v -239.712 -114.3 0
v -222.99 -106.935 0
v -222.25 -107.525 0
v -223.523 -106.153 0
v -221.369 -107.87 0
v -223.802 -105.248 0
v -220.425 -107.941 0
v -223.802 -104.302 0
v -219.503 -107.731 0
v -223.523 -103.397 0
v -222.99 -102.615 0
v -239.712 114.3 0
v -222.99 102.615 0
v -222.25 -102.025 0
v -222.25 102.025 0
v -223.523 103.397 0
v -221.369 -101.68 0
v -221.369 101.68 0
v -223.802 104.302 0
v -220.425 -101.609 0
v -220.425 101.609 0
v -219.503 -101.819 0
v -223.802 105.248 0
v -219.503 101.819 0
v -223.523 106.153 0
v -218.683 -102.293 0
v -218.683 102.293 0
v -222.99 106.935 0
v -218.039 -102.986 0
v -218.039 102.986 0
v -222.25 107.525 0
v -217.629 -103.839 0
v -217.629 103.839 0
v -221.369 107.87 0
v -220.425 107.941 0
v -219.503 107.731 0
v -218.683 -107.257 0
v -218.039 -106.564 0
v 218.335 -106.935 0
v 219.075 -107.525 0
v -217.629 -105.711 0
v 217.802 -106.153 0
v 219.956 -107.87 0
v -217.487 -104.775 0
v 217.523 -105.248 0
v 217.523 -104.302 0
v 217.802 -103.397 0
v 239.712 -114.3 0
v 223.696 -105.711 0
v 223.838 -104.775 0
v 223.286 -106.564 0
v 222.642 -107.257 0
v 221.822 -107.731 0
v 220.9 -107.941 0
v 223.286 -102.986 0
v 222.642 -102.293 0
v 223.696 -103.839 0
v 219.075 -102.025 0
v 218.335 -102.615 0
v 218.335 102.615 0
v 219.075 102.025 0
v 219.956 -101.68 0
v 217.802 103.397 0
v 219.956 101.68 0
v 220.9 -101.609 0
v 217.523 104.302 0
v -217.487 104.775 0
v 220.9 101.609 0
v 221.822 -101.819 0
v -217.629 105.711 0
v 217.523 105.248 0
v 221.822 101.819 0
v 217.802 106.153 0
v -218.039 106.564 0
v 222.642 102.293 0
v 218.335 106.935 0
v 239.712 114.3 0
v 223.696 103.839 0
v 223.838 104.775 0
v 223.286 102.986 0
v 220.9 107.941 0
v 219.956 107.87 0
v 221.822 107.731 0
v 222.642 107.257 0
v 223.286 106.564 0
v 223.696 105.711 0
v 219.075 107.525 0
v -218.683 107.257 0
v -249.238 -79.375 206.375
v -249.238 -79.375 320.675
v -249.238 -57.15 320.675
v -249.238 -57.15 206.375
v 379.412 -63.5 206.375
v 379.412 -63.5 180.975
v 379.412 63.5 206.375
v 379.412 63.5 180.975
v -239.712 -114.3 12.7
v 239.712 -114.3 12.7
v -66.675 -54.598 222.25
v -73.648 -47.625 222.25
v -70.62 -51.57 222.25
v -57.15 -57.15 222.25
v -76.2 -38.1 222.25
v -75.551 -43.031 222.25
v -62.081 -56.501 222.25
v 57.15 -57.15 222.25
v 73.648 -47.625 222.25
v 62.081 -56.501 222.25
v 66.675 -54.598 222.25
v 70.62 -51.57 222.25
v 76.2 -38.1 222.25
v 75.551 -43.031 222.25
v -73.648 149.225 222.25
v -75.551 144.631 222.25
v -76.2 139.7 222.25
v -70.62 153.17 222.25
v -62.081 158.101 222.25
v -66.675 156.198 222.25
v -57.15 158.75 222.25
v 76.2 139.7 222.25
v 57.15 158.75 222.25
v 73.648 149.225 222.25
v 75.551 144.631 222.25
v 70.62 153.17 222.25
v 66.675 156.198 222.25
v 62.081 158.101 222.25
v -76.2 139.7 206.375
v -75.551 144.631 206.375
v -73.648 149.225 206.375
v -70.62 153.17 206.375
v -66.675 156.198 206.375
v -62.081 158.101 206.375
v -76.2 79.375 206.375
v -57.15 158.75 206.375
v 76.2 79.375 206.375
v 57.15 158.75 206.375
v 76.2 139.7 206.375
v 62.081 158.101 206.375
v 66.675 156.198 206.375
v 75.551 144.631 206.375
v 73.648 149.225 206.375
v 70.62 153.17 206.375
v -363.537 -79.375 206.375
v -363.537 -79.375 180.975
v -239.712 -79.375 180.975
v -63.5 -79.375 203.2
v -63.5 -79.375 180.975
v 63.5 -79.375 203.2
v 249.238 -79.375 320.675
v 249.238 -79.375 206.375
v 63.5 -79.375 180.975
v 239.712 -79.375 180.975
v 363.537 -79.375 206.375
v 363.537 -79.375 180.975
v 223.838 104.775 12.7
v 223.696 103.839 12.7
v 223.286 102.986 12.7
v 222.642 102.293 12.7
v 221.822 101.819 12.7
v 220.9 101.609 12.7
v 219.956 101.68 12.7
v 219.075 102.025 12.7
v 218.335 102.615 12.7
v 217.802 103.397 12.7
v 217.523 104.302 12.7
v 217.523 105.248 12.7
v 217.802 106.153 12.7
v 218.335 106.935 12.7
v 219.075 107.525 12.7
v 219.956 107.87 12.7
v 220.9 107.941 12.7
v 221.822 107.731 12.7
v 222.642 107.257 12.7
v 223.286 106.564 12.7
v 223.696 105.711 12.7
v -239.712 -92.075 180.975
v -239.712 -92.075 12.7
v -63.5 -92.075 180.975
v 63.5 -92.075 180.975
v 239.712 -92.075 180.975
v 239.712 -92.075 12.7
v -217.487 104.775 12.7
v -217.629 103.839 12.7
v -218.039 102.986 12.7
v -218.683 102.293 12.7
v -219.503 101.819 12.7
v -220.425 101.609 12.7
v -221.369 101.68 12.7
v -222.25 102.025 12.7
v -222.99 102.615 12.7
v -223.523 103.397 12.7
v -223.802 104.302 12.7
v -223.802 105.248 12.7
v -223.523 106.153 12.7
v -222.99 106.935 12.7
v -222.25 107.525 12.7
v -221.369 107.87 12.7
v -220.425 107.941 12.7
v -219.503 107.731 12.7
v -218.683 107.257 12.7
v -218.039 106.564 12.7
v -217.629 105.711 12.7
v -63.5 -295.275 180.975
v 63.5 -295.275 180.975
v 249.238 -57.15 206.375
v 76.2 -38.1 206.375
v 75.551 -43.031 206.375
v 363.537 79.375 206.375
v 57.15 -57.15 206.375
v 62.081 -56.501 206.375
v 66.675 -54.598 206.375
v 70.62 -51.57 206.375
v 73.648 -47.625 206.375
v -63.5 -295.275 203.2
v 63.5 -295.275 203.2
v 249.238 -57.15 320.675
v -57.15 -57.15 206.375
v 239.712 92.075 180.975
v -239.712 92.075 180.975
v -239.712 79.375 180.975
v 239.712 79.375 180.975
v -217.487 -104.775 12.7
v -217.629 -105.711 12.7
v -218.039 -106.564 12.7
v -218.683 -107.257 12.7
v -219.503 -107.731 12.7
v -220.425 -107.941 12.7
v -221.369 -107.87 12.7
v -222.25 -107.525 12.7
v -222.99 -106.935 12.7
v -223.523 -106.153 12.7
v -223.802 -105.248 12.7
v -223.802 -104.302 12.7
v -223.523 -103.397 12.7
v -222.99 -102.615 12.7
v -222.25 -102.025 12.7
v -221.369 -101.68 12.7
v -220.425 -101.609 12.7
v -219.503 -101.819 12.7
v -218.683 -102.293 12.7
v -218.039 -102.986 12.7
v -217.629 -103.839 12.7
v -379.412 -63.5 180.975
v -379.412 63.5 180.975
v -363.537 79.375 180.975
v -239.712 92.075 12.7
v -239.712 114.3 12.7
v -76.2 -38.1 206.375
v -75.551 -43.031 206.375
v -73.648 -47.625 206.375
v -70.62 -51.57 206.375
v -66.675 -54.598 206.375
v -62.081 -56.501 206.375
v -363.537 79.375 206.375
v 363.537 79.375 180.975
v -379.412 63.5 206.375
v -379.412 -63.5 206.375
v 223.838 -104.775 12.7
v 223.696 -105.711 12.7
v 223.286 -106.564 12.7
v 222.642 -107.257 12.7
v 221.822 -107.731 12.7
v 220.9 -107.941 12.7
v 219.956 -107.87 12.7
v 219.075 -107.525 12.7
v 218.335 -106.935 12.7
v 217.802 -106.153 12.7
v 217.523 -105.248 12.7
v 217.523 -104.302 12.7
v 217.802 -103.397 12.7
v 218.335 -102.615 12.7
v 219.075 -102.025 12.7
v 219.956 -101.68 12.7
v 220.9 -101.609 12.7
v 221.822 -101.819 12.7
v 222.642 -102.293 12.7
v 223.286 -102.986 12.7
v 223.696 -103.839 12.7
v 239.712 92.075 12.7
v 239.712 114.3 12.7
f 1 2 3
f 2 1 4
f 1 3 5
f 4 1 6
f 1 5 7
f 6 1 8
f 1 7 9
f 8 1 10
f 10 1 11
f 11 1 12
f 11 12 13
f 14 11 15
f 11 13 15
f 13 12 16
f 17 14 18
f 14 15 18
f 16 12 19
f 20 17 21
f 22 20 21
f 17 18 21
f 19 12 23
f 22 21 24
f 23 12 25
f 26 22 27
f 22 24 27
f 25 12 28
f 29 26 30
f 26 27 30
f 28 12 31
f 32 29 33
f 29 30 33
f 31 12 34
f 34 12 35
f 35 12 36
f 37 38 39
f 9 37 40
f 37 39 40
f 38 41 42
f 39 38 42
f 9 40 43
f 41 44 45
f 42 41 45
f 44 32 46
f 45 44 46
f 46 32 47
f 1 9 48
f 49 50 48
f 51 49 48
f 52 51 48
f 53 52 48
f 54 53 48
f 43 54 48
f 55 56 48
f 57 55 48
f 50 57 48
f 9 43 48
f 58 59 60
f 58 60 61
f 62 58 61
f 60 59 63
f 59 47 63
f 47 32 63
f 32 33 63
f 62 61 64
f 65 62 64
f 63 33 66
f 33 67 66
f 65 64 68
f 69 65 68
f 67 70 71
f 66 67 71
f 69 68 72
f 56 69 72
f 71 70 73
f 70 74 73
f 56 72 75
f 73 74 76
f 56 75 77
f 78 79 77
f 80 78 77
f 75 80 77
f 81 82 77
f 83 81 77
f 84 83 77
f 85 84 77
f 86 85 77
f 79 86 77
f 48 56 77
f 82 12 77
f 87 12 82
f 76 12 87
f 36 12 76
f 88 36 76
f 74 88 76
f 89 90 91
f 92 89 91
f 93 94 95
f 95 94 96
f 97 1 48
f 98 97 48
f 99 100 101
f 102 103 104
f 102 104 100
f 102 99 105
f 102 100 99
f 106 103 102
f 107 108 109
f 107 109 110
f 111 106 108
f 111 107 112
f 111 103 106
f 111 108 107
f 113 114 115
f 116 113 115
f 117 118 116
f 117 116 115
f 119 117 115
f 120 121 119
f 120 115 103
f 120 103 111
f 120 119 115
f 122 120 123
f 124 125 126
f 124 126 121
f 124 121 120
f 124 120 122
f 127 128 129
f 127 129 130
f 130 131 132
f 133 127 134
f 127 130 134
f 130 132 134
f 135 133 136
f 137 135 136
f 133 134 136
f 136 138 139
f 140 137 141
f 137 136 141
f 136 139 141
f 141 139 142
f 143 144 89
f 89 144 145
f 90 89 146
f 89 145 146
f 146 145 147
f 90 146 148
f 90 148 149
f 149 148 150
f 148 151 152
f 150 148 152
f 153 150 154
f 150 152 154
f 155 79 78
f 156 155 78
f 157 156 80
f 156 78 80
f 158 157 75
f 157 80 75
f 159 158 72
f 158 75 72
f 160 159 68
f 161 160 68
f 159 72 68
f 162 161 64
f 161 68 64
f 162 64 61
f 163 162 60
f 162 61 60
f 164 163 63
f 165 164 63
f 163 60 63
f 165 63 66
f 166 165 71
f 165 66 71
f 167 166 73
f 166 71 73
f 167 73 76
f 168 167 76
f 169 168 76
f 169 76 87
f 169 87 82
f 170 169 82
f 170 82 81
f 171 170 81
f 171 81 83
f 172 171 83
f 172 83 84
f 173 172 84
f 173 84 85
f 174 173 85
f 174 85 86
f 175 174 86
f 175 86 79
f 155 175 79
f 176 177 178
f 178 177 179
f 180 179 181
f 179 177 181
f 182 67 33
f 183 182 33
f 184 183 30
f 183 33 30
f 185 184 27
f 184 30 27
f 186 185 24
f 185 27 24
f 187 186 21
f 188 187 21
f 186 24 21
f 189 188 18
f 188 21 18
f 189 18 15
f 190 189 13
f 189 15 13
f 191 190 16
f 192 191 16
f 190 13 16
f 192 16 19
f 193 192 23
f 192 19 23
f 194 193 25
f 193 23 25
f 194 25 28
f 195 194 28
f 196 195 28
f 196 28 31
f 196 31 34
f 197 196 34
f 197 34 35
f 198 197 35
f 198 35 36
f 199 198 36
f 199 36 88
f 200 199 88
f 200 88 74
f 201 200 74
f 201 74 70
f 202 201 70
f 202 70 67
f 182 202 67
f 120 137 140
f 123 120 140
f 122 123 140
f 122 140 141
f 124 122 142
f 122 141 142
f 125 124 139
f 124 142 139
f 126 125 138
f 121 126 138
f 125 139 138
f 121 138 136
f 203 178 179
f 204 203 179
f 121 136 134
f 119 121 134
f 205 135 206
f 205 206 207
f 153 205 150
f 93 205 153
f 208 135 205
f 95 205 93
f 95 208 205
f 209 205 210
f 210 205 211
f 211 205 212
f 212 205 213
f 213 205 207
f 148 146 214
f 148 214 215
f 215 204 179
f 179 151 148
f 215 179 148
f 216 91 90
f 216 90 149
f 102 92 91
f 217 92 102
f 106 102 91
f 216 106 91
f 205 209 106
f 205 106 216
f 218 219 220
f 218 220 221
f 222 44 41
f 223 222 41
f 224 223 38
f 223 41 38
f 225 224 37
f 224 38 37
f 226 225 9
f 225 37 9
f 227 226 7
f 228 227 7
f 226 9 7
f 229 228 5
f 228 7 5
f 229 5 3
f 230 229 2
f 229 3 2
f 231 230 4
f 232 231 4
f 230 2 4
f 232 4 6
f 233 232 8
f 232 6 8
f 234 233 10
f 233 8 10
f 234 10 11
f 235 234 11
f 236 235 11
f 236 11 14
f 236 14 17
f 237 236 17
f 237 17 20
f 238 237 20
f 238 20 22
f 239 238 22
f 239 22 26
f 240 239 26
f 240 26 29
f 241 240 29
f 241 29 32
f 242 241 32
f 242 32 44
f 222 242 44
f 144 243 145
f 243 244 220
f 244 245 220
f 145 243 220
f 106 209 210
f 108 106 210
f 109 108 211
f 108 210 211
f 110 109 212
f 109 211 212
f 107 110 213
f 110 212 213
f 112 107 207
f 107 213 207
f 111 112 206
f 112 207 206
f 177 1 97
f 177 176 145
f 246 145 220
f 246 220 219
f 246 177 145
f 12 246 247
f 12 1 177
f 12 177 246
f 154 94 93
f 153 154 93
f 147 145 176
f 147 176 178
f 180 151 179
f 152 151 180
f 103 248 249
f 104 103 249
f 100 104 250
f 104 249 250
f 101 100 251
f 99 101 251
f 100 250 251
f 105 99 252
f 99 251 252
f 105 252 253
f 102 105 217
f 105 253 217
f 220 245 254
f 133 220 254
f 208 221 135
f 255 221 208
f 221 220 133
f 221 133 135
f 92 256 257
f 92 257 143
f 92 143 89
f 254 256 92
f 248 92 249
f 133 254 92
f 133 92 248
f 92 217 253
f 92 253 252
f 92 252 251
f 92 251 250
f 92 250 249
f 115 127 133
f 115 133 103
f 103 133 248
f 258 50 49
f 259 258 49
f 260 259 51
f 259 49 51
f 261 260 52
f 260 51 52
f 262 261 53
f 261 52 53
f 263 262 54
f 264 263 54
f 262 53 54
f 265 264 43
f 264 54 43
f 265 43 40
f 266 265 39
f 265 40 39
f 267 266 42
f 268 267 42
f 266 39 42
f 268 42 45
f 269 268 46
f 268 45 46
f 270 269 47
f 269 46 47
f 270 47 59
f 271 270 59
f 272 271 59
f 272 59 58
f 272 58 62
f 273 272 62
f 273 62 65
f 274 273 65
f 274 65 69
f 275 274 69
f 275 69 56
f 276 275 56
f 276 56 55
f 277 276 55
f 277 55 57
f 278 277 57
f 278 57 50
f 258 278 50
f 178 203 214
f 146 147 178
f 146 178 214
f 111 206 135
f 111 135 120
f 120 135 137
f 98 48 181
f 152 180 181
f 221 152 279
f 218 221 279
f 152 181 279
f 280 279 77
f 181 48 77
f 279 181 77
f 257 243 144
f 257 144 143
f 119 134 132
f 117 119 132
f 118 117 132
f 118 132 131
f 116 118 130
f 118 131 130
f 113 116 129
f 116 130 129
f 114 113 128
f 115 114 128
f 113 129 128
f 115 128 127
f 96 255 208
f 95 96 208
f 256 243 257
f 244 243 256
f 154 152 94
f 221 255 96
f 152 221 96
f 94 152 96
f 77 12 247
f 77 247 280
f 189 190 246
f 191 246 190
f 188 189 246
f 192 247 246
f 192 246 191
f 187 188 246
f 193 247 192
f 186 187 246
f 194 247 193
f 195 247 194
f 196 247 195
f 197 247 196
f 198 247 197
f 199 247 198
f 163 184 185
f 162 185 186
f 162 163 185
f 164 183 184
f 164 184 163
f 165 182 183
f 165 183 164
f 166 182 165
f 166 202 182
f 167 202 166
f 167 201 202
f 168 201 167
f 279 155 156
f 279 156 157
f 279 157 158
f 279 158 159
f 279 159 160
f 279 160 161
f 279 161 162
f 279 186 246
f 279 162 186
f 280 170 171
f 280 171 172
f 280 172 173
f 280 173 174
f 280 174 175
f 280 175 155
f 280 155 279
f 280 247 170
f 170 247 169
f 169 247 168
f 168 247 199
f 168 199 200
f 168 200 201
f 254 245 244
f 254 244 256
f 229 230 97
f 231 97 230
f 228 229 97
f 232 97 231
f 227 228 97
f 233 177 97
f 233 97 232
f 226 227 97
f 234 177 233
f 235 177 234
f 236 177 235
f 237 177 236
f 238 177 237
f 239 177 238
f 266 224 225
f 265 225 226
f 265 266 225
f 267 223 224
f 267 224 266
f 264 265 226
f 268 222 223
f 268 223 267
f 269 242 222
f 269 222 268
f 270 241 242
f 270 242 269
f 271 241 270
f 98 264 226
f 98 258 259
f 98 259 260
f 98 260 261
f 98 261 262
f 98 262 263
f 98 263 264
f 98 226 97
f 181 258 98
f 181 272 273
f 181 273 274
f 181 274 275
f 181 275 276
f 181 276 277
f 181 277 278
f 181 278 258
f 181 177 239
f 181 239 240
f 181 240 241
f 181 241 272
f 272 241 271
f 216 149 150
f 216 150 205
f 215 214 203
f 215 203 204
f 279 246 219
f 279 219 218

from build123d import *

# Parameters (mm, degrees)
F0_W      = 479.425
F0_H      = 228.6
F1_DEPTH  = 12.7
F2_R      = 3.175
F3_DEPTH  = 12.701
F4_W      = 479.425
F4_H      = 184.15
F5_DEPTH  = 168.275
F6_W      = 758.825
F6_H      = 158.75
F7_DEPTH  = 25.4
F8_W      = 498.475
F8_H      = 22.225
F9_DEPTH  = 114.3
F10_W     = 127
F10_H     = 22.225
F11_DEPTH = 215.9
F12_SIZE  = 15.875
F14_DEPTH = 15.875


with BuildPart() as f1:
    # F0 (on Top) → F1 (new body)
    with BuildSketch(Plane.XY):
        Rectangle(F0_W, F0_H)
    extrude(amount=F1_DEPTH)

    # F2 (on face) → F3 (cut, through all)
    with BuildSketch(Plane(origin=(0, 0, 0), x_dir=(1, 0, 0), z_dir=(0, 0, -1))):
        with Locations((220.6625, -104.775)):
            Circle(F2_R)
        with Locations((-220.6625, -104.775)):
            Circle(F2_R)
        with Locations((220.6625, 104.775)):
            Circle(F2_R)
        with Locations((-220.6625, 104.775)):
            Circle(F2_R)
    extrude(amount=-F3_DEPTH, mode=Mode.SUBTRACT)

    # F4 (on face) → F5 (join)
    with BuildSketch(Plane.XY.offset(12.7)):
        Rectangle(F4_W, F4_H)
    extrude(amount=F5_DEPTH)

    # F6 (on face) → F7 (join)
    with BuildSketch(Plane.XY.offset(180.975)):
        Rectangle(F6_W, F6_H)
    extrude(amount=F7_DEPTH)

    # F8 (on face) → F9 (join)
    with BuildSketch(Plane.XY.offset(206.375)):
        with Locations((0, -68.2625)):
            Rectangle(F8_W, F8_H)
    extrude(amount=F9_DEPTH)

    # F10 (on face) → F11 (join)
    with BuildSketch(Plane.XZ.offset(79.375)):
        with Locations((0, 192.0875)):
            Rectangle(F10_W, F10_H)
    extrude(amount=F11_DEPTH)

    # F12
    f12_edges = [f1.edges().sort_by_distance(p)[0] for p in [
        (-379.4125, 79.375, 193.675),
        (-379.4125, -79.375, 193.675),
        (379.4125, -79.375, 193.675),
        (379.4125, 79.375, 193.675),
    ]]
    chamfer(f12_edges, length=F12_SIZE)

    # F13 (on face) → F14 (join)
    with BuildSketch(Plane.XY.offset(206.375)):
        with BuildLine():
            ThreePointArc((-76.2, -38.1), (-70.620384, -51.570384), (-57.15, -57.15))
            Line((-57.15, -57.15), (57.15, -57.15))
            ThreePointArc((57.15, -57.15), (70.620384, -51.570384), (76.2, -38.1))
            Line((76.2, -38.1), (76.2, 139.7))
            ThreePointArc((76.2, 139.7), (70.620384, 153.170384), (57.15, 158.75))
            Line((57.15, 158.75), (-57.15, 158.75))
            ThreePointArc((-57.15, 158.75), (-70.620384, 153.170384), (-76.2, 139.7))
            Line((-76.2, 139.7), (-76.2, -38.1))
        make_face()
    extrude(amount=F14_DEPTH)


solid = f1.part
